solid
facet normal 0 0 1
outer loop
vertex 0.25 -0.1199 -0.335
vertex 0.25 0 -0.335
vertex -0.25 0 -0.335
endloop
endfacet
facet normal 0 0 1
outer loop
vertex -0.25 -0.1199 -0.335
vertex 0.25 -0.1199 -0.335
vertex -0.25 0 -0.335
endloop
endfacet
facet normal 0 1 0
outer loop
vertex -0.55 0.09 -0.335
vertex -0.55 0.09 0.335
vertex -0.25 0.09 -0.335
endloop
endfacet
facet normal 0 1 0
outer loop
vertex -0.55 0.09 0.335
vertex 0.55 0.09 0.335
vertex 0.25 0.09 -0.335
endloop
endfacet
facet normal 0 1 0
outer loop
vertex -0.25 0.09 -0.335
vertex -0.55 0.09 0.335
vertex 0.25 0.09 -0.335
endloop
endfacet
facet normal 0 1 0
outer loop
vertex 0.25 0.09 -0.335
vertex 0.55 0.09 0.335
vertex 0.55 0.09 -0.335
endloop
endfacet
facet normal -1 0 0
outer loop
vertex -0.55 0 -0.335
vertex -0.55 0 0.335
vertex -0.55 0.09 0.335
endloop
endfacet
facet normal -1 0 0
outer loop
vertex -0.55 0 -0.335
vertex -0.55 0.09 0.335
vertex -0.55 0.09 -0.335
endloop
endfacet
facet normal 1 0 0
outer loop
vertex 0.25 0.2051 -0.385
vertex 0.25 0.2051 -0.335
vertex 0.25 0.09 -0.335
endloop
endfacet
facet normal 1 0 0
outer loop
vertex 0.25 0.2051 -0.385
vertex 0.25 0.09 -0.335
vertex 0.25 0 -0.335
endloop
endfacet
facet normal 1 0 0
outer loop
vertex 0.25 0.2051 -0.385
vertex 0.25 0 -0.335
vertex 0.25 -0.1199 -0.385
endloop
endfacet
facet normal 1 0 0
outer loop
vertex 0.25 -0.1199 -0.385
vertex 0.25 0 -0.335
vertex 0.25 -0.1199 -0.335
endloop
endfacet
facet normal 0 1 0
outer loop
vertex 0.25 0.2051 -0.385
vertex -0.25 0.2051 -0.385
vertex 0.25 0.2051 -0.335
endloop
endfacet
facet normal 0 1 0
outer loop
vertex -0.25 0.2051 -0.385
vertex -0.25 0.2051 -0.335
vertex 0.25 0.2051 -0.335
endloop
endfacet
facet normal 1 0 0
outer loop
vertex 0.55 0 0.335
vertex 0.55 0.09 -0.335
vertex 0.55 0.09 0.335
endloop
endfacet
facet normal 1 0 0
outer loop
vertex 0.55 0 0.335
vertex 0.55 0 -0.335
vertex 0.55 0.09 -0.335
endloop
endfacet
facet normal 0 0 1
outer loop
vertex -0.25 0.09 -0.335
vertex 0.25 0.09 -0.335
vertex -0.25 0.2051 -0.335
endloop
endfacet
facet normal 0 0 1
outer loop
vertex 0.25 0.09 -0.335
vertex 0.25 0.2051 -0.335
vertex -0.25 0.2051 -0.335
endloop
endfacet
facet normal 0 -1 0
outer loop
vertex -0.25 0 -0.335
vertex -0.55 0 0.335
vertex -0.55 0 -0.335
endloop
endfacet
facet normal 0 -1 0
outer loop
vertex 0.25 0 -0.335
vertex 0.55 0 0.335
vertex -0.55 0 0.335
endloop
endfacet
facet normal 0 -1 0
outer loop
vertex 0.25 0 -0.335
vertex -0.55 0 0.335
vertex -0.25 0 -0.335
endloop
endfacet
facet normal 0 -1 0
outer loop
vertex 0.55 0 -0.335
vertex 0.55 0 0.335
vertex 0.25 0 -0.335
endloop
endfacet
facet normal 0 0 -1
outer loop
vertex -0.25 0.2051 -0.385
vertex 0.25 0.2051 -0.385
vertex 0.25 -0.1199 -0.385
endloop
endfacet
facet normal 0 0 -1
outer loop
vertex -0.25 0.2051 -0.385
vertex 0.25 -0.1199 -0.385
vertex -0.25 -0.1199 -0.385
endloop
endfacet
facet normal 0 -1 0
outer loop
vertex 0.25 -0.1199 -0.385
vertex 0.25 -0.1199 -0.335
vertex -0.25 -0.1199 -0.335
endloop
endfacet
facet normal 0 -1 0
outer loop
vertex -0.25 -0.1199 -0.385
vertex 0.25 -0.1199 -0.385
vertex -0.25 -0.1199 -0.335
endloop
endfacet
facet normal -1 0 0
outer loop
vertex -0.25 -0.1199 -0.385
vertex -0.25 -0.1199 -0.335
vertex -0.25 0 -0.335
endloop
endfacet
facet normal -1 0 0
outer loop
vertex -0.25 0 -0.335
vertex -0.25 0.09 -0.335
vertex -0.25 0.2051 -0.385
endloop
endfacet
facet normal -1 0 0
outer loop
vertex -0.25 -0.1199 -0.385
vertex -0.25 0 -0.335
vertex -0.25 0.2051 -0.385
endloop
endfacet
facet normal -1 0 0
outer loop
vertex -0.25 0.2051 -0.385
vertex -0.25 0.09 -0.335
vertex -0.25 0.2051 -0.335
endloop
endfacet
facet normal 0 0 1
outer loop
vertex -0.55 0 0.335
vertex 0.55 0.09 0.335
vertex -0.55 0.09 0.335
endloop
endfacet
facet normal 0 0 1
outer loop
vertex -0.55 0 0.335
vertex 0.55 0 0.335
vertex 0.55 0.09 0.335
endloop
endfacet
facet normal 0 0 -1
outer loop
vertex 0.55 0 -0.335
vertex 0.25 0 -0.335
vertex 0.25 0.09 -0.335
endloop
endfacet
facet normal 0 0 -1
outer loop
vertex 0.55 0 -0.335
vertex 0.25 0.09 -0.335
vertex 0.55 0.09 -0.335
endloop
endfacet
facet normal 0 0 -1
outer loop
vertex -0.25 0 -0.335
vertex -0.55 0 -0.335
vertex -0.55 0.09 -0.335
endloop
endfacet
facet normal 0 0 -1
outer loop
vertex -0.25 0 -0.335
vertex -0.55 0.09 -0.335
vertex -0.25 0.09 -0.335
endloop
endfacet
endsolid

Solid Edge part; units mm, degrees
sketch "Sketch1" plane through (0, 0, 0) normal (0, -1, 0) x (1, 0, 0)
  line L0 (-0.55, -0.335) -> (0.55, -0.335)
  line L1 (0.55, -0.335) -> (0.55, 0.335)
  line L2 (0.55, 0.335) -> (-0.55, 0.335)
  line L3 (-0.55, 0.335) -> (-0.55, -0.335)
  dimension "D1" = 1.1
  dimension "D2" = 0.67
extrude "Protrusion1" add sketch "Sketch1" against normal blind 0.09
sketch "Sketch2" plane through (0, 0.045, -0.335) normal (0, 0, -1) x (1, 0, 0)
  line L0 (-0.25, -0.1601) -> (0.25, -0.1601)
  line L1 (0.25, -0.1601) -> (0.25, 0.1649)
  line L2 (0.25, 0.1649) -> (-0.25, 0.1649)
  line L3 (-0.25, 0.1649) -> (-0.25, -0.1601)
  dimension "D1" = 0.325
  dimension "D2" = 0.5
  dimension "D3" = 0.0426
extrude "Ausprägung_2" add sketch "Sketch2" along normal blind 0.05
